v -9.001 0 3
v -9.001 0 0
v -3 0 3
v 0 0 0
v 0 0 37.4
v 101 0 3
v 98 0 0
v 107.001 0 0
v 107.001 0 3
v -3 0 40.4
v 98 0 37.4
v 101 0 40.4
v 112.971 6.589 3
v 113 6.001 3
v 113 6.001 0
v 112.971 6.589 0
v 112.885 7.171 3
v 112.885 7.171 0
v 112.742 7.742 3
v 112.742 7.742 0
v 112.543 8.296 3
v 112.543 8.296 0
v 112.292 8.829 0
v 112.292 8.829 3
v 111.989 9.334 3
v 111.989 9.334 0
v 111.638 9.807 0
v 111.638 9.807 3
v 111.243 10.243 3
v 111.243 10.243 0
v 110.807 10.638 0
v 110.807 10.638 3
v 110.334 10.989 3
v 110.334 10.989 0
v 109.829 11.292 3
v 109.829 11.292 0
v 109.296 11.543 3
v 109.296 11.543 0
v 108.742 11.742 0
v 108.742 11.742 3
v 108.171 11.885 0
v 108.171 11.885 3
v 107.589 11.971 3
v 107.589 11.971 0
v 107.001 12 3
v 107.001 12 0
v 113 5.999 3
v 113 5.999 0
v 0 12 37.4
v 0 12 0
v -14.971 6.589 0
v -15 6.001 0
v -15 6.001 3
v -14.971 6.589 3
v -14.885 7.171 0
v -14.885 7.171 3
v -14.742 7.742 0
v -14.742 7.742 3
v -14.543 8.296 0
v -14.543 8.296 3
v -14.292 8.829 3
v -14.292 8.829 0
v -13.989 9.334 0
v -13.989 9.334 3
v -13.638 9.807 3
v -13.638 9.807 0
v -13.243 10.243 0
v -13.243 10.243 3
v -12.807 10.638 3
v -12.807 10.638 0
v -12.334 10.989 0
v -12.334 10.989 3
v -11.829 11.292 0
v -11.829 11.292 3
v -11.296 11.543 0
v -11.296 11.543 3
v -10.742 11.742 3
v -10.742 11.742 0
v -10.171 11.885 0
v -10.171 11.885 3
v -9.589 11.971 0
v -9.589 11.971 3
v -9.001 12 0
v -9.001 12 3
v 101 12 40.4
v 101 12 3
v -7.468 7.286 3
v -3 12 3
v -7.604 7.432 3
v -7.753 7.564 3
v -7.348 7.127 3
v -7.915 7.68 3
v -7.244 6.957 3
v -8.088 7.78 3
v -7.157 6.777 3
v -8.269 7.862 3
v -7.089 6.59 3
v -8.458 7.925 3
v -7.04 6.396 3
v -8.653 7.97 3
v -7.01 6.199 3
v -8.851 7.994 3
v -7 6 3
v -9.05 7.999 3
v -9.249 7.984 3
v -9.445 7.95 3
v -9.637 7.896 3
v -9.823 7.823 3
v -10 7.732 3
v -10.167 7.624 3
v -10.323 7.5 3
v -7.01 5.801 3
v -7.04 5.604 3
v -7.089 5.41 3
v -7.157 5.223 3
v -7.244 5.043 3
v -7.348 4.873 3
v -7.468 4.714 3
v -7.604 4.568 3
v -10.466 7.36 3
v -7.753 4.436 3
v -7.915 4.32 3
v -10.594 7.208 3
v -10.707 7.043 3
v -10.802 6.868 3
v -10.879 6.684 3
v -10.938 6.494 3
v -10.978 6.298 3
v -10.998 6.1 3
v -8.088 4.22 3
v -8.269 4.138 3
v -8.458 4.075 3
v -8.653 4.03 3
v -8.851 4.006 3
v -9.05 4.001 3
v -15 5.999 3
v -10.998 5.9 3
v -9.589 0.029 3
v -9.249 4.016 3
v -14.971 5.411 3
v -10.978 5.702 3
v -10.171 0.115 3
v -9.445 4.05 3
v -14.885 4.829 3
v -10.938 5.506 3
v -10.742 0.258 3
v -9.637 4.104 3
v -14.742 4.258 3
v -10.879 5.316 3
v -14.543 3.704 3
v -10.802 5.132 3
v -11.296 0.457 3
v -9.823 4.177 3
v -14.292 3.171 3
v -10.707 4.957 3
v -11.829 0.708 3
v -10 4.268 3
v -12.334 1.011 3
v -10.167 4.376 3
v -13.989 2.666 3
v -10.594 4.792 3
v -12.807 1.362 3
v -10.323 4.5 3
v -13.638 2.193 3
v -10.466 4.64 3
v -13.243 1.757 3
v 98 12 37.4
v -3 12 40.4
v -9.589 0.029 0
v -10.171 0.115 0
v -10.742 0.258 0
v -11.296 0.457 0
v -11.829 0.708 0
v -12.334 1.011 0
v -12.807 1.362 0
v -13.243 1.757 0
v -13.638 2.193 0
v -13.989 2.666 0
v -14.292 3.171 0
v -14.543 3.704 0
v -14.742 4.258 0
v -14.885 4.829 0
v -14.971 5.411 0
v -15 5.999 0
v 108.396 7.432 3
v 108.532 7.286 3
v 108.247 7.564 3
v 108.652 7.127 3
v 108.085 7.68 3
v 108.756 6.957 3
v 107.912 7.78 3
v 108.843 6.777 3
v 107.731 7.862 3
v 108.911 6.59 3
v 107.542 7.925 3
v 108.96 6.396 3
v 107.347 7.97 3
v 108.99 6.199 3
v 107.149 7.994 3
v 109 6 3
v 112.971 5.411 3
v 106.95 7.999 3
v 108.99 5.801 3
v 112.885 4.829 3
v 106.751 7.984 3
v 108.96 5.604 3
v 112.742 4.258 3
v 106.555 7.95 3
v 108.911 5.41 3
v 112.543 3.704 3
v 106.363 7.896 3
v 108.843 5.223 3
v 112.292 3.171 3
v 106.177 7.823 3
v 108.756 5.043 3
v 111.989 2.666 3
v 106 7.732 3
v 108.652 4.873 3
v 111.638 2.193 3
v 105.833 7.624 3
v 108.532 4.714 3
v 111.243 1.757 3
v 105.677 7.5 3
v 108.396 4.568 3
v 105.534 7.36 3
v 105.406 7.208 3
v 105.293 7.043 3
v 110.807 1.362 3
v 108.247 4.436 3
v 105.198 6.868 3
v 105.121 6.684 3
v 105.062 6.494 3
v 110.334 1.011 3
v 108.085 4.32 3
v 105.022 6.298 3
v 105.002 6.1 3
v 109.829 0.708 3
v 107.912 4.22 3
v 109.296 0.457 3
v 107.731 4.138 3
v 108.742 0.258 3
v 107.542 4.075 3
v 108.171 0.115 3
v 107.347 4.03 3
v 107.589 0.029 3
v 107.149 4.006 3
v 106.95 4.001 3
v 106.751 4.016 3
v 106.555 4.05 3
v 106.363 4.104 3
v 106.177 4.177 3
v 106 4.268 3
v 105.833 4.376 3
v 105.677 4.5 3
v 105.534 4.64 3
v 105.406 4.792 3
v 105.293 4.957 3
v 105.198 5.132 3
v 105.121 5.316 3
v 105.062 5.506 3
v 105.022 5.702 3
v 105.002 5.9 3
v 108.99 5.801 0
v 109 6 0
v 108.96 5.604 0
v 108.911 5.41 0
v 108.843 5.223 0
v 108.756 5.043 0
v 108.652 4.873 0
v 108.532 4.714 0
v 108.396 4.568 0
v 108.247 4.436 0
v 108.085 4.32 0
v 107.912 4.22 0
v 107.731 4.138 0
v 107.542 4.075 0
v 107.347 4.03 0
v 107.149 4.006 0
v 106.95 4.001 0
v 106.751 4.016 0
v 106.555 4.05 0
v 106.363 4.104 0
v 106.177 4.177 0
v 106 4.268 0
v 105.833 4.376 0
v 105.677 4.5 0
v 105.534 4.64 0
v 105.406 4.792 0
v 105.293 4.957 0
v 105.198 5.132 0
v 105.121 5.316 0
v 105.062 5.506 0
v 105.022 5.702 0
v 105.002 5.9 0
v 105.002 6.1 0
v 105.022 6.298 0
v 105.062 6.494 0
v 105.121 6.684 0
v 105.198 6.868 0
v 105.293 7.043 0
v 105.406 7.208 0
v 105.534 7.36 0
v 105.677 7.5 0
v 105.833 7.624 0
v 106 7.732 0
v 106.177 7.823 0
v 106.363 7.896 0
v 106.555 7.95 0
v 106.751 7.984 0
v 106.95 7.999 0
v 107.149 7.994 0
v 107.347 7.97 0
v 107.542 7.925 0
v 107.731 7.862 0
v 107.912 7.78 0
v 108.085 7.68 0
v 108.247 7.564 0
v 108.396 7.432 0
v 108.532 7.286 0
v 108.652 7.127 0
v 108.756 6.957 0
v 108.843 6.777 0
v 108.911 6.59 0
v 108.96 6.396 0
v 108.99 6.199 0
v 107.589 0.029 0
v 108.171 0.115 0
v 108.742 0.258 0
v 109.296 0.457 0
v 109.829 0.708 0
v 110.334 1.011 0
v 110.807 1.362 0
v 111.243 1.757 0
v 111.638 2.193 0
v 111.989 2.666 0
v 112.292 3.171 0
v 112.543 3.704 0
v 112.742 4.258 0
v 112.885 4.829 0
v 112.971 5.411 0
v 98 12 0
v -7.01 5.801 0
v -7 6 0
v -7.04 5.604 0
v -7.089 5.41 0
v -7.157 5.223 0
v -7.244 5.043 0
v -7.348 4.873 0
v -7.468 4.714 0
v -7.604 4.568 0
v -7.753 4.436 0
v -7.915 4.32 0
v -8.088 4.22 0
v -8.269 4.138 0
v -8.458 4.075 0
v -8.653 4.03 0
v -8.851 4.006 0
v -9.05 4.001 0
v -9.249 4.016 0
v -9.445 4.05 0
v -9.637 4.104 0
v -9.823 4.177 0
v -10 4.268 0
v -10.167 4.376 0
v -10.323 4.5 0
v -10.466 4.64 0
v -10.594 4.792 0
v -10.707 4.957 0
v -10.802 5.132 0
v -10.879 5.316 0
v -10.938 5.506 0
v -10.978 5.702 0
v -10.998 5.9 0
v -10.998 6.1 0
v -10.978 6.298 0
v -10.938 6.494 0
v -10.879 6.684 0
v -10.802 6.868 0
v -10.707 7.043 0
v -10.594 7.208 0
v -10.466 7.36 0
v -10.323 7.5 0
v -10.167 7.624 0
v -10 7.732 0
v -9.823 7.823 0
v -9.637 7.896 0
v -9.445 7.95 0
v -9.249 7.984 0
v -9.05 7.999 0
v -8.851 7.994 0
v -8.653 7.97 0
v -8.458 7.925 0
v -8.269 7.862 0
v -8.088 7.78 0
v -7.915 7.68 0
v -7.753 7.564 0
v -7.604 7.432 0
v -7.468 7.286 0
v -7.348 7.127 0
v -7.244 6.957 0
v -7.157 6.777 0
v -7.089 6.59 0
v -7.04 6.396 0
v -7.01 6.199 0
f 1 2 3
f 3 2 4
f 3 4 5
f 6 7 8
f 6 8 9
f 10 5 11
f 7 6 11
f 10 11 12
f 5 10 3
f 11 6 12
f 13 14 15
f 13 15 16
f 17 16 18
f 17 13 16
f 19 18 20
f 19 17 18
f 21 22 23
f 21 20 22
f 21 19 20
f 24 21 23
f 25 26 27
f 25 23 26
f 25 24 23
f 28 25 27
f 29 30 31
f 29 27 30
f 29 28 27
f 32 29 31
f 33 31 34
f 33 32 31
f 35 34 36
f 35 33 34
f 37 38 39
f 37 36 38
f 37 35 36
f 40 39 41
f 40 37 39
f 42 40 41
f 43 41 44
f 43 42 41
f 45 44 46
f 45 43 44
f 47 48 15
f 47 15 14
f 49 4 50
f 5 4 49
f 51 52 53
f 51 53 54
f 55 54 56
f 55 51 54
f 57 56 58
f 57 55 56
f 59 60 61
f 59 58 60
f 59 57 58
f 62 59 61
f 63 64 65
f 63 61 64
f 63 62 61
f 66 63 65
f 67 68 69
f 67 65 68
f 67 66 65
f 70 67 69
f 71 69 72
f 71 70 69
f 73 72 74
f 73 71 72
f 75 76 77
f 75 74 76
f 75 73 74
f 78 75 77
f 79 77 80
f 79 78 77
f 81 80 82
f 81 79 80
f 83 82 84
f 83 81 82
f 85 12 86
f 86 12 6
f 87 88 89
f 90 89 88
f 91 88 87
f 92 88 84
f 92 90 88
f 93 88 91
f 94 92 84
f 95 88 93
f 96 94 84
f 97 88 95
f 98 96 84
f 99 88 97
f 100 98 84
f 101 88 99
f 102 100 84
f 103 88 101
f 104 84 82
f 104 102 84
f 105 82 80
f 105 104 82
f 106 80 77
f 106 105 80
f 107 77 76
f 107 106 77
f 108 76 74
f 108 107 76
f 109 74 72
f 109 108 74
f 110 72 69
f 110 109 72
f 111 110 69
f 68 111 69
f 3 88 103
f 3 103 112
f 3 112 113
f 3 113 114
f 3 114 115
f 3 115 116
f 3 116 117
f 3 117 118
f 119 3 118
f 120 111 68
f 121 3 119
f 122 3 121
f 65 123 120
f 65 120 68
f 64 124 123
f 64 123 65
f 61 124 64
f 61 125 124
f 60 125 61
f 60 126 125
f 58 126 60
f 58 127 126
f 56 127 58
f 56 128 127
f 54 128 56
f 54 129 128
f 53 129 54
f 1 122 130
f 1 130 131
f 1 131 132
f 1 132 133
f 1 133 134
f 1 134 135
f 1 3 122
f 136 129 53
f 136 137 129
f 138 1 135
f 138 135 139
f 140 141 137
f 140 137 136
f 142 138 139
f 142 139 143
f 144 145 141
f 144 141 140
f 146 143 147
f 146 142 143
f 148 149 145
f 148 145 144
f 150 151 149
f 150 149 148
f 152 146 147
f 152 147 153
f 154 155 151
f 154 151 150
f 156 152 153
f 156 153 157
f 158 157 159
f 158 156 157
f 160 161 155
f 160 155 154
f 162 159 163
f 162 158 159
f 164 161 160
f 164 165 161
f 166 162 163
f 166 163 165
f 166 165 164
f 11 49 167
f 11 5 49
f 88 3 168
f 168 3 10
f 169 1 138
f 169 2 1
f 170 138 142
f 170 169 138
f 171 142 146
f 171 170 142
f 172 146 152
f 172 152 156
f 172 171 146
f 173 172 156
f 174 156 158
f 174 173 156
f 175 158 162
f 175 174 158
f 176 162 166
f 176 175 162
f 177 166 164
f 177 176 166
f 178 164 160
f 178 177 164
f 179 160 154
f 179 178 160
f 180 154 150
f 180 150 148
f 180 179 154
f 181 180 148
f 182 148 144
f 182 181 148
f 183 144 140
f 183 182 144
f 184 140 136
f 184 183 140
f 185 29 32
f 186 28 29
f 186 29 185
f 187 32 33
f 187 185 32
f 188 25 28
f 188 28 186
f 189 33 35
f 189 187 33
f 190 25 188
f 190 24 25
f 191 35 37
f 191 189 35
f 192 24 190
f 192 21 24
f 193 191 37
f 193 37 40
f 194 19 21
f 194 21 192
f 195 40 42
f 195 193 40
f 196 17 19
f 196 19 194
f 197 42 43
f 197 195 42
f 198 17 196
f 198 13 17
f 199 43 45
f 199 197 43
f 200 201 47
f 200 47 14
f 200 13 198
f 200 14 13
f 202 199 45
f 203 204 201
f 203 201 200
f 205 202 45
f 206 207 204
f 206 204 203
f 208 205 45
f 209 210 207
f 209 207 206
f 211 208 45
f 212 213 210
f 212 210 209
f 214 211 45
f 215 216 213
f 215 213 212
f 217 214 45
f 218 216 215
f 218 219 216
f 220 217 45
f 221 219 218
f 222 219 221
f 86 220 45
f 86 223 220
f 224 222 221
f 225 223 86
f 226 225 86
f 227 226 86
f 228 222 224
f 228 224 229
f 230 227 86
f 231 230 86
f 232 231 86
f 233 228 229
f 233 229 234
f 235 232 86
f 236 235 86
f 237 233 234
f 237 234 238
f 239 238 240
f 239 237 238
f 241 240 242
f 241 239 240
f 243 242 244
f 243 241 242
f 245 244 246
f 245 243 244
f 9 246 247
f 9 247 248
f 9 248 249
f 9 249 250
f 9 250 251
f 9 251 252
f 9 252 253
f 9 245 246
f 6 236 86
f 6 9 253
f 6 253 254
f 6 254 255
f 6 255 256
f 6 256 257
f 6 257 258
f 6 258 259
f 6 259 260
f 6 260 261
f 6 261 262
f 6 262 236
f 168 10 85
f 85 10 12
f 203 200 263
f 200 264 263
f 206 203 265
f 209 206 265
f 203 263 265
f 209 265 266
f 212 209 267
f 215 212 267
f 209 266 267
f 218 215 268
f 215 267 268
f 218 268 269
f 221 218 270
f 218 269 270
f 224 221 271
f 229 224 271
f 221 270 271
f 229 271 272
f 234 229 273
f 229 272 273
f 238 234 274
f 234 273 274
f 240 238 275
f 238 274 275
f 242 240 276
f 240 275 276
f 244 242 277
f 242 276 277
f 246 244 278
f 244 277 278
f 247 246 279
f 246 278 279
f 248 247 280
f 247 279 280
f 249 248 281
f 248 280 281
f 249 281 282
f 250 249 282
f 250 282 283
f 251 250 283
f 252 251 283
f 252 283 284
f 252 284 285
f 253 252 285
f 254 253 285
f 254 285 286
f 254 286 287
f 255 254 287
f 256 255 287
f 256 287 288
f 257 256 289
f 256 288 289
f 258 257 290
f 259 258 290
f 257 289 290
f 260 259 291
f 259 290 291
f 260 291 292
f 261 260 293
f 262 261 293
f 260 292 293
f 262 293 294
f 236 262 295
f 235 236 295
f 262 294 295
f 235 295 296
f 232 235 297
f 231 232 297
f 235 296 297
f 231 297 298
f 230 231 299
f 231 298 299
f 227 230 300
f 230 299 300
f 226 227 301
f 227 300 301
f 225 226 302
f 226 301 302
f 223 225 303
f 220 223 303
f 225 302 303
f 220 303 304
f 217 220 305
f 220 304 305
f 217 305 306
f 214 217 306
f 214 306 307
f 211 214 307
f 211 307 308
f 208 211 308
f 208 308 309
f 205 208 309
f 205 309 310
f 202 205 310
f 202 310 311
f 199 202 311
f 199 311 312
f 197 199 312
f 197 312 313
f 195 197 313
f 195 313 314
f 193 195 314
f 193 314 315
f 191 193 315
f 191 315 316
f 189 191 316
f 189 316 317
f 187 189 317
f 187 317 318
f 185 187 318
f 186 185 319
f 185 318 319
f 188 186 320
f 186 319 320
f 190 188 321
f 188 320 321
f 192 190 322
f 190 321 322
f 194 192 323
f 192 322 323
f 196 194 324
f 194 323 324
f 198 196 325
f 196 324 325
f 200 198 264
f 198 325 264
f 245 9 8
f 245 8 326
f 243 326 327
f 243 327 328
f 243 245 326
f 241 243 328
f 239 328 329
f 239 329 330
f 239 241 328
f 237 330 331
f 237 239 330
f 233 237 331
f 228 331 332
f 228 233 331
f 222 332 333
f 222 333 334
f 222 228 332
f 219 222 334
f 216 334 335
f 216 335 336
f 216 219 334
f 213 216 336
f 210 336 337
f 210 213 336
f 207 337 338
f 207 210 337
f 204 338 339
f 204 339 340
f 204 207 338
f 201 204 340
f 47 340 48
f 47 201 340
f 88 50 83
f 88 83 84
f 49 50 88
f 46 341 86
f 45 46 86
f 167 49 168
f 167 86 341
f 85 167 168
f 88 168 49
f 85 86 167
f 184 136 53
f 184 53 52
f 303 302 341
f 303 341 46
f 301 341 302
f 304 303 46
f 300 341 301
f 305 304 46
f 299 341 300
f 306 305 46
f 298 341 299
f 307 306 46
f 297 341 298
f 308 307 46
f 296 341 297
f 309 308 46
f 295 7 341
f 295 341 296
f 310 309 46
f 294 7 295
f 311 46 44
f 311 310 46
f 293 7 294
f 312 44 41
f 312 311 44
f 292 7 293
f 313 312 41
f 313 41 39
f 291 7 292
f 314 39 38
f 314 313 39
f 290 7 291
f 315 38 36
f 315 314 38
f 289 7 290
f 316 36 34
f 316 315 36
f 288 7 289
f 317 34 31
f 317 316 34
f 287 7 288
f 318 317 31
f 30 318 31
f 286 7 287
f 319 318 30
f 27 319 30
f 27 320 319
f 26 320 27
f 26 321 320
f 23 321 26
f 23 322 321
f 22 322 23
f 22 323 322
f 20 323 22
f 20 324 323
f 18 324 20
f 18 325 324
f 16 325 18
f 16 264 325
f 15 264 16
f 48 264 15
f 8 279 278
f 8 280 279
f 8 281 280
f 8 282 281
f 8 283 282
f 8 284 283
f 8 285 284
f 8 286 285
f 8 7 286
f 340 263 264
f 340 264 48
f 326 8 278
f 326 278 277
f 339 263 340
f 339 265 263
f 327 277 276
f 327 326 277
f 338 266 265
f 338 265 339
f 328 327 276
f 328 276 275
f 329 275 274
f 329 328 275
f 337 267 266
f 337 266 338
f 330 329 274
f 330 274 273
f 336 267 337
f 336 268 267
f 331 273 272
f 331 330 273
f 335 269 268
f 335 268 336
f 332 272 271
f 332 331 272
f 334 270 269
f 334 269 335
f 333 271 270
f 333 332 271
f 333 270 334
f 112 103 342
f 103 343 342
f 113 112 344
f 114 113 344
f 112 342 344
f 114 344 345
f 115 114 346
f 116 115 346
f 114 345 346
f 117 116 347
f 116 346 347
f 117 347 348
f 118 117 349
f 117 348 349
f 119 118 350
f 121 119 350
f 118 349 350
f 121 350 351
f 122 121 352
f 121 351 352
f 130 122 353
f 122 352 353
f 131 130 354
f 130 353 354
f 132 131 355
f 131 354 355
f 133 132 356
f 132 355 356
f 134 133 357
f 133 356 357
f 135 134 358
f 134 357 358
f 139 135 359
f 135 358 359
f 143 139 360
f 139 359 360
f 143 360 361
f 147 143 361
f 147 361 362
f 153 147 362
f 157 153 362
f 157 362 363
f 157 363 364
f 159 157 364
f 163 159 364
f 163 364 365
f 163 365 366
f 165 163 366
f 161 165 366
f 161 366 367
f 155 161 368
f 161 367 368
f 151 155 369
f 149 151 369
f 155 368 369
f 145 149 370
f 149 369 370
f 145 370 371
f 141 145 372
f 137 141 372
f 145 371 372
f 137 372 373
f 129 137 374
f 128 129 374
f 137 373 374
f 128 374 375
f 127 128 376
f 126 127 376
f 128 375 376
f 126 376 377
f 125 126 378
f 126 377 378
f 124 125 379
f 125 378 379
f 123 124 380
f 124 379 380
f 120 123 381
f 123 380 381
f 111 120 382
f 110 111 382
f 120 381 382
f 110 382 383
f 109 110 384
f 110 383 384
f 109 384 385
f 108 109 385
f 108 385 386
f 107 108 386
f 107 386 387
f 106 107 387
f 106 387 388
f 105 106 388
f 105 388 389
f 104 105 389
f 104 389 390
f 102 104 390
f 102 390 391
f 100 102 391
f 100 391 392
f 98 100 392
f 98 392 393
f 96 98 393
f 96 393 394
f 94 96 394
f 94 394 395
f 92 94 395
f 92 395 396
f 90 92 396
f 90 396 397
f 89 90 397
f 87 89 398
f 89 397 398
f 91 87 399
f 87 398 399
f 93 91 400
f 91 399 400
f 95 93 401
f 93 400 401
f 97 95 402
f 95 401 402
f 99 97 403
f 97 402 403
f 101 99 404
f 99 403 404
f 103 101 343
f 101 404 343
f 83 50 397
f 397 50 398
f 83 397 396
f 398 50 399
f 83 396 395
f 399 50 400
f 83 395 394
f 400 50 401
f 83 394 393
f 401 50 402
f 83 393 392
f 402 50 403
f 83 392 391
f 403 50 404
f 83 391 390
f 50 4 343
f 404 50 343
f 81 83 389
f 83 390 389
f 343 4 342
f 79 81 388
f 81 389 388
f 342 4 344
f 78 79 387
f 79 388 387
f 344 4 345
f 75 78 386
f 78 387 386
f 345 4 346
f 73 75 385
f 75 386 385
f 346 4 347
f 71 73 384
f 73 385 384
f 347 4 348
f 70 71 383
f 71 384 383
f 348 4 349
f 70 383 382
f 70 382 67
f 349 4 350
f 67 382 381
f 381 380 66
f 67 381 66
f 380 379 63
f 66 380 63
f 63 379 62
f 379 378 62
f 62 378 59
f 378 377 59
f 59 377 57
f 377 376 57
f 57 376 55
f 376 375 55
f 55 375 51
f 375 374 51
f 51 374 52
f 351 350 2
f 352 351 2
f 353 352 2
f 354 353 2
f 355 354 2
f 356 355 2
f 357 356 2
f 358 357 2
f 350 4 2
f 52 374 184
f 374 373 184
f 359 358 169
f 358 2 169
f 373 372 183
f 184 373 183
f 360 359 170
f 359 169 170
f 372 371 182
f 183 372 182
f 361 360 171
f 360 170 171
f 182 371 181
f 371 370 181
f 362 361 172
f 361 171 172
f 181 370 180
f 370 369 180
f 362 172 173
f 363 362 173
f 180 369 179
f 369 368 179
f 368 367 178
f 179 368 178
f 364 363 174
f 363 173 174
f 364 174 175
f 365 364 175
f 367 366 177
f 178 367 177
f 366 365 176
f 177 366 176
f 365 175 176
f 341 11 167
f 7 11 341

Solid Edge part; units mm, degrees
sketch "Sketch1" plane through (0, 0, 0) normal (0, -1, 0) x (1, 0, 0)
  line L0 (-3, 40.4) -> (101, 40.4)
  line L1 (101, 40.4) -> (101, 0)
  line L2 (98, 0) -> (101, 0)
  line L3 (98, 37.4) -> (98, 0)
  line L4 (0, 37.4) -> (98, 37.4)
  line L5 (0, 0) -> (0, 37.4)
  line L6 (0, 0) -> (-3, 0)
  line L7 (-3, 0) -> (-3, 40.4)
  line L8 (-3, 3) -> (-15, 3)
  line L9 (-15, 3) -> (-15, 0)
  line L10 (-15, 0) -> (-3, 0)
  line L11 (-3, 0) -> (-3, 3)
  line L12 (113, 3) -> (101, 3)
  line L13 (101, 3) -> (101, 0)
  line L14 (101, 0) -> (113, 0)
  line L15 (113, 0) -> (113, 3)
  dimension "D1" = 98
  dimension "D2" = 37.4
  dimension "D3" = 3
  dimension "D4" = 12
  dimension "D5" = 3
extrude "Protrusion1" add sketch "Sketch1" against normal blind 12
fillet "Redondeo_1" radius 6 4 edges at (113, 0, 1.5) (113, 12, 1.5) (-15, 0, 1.5) (-15, 12, 1.5)
sketch "Sketch2" plane through (-7.5, 6, 0) normal (0, 0, -1) x (1, 0, 0)
  circle A0 centre (-1.5, 0) radius 2
  circle A1 centre (114.5, 0) radius 2
  dimension "D1" = 4
extrude "Cutout1" cut sketch "Sketch2" against normal up to next
